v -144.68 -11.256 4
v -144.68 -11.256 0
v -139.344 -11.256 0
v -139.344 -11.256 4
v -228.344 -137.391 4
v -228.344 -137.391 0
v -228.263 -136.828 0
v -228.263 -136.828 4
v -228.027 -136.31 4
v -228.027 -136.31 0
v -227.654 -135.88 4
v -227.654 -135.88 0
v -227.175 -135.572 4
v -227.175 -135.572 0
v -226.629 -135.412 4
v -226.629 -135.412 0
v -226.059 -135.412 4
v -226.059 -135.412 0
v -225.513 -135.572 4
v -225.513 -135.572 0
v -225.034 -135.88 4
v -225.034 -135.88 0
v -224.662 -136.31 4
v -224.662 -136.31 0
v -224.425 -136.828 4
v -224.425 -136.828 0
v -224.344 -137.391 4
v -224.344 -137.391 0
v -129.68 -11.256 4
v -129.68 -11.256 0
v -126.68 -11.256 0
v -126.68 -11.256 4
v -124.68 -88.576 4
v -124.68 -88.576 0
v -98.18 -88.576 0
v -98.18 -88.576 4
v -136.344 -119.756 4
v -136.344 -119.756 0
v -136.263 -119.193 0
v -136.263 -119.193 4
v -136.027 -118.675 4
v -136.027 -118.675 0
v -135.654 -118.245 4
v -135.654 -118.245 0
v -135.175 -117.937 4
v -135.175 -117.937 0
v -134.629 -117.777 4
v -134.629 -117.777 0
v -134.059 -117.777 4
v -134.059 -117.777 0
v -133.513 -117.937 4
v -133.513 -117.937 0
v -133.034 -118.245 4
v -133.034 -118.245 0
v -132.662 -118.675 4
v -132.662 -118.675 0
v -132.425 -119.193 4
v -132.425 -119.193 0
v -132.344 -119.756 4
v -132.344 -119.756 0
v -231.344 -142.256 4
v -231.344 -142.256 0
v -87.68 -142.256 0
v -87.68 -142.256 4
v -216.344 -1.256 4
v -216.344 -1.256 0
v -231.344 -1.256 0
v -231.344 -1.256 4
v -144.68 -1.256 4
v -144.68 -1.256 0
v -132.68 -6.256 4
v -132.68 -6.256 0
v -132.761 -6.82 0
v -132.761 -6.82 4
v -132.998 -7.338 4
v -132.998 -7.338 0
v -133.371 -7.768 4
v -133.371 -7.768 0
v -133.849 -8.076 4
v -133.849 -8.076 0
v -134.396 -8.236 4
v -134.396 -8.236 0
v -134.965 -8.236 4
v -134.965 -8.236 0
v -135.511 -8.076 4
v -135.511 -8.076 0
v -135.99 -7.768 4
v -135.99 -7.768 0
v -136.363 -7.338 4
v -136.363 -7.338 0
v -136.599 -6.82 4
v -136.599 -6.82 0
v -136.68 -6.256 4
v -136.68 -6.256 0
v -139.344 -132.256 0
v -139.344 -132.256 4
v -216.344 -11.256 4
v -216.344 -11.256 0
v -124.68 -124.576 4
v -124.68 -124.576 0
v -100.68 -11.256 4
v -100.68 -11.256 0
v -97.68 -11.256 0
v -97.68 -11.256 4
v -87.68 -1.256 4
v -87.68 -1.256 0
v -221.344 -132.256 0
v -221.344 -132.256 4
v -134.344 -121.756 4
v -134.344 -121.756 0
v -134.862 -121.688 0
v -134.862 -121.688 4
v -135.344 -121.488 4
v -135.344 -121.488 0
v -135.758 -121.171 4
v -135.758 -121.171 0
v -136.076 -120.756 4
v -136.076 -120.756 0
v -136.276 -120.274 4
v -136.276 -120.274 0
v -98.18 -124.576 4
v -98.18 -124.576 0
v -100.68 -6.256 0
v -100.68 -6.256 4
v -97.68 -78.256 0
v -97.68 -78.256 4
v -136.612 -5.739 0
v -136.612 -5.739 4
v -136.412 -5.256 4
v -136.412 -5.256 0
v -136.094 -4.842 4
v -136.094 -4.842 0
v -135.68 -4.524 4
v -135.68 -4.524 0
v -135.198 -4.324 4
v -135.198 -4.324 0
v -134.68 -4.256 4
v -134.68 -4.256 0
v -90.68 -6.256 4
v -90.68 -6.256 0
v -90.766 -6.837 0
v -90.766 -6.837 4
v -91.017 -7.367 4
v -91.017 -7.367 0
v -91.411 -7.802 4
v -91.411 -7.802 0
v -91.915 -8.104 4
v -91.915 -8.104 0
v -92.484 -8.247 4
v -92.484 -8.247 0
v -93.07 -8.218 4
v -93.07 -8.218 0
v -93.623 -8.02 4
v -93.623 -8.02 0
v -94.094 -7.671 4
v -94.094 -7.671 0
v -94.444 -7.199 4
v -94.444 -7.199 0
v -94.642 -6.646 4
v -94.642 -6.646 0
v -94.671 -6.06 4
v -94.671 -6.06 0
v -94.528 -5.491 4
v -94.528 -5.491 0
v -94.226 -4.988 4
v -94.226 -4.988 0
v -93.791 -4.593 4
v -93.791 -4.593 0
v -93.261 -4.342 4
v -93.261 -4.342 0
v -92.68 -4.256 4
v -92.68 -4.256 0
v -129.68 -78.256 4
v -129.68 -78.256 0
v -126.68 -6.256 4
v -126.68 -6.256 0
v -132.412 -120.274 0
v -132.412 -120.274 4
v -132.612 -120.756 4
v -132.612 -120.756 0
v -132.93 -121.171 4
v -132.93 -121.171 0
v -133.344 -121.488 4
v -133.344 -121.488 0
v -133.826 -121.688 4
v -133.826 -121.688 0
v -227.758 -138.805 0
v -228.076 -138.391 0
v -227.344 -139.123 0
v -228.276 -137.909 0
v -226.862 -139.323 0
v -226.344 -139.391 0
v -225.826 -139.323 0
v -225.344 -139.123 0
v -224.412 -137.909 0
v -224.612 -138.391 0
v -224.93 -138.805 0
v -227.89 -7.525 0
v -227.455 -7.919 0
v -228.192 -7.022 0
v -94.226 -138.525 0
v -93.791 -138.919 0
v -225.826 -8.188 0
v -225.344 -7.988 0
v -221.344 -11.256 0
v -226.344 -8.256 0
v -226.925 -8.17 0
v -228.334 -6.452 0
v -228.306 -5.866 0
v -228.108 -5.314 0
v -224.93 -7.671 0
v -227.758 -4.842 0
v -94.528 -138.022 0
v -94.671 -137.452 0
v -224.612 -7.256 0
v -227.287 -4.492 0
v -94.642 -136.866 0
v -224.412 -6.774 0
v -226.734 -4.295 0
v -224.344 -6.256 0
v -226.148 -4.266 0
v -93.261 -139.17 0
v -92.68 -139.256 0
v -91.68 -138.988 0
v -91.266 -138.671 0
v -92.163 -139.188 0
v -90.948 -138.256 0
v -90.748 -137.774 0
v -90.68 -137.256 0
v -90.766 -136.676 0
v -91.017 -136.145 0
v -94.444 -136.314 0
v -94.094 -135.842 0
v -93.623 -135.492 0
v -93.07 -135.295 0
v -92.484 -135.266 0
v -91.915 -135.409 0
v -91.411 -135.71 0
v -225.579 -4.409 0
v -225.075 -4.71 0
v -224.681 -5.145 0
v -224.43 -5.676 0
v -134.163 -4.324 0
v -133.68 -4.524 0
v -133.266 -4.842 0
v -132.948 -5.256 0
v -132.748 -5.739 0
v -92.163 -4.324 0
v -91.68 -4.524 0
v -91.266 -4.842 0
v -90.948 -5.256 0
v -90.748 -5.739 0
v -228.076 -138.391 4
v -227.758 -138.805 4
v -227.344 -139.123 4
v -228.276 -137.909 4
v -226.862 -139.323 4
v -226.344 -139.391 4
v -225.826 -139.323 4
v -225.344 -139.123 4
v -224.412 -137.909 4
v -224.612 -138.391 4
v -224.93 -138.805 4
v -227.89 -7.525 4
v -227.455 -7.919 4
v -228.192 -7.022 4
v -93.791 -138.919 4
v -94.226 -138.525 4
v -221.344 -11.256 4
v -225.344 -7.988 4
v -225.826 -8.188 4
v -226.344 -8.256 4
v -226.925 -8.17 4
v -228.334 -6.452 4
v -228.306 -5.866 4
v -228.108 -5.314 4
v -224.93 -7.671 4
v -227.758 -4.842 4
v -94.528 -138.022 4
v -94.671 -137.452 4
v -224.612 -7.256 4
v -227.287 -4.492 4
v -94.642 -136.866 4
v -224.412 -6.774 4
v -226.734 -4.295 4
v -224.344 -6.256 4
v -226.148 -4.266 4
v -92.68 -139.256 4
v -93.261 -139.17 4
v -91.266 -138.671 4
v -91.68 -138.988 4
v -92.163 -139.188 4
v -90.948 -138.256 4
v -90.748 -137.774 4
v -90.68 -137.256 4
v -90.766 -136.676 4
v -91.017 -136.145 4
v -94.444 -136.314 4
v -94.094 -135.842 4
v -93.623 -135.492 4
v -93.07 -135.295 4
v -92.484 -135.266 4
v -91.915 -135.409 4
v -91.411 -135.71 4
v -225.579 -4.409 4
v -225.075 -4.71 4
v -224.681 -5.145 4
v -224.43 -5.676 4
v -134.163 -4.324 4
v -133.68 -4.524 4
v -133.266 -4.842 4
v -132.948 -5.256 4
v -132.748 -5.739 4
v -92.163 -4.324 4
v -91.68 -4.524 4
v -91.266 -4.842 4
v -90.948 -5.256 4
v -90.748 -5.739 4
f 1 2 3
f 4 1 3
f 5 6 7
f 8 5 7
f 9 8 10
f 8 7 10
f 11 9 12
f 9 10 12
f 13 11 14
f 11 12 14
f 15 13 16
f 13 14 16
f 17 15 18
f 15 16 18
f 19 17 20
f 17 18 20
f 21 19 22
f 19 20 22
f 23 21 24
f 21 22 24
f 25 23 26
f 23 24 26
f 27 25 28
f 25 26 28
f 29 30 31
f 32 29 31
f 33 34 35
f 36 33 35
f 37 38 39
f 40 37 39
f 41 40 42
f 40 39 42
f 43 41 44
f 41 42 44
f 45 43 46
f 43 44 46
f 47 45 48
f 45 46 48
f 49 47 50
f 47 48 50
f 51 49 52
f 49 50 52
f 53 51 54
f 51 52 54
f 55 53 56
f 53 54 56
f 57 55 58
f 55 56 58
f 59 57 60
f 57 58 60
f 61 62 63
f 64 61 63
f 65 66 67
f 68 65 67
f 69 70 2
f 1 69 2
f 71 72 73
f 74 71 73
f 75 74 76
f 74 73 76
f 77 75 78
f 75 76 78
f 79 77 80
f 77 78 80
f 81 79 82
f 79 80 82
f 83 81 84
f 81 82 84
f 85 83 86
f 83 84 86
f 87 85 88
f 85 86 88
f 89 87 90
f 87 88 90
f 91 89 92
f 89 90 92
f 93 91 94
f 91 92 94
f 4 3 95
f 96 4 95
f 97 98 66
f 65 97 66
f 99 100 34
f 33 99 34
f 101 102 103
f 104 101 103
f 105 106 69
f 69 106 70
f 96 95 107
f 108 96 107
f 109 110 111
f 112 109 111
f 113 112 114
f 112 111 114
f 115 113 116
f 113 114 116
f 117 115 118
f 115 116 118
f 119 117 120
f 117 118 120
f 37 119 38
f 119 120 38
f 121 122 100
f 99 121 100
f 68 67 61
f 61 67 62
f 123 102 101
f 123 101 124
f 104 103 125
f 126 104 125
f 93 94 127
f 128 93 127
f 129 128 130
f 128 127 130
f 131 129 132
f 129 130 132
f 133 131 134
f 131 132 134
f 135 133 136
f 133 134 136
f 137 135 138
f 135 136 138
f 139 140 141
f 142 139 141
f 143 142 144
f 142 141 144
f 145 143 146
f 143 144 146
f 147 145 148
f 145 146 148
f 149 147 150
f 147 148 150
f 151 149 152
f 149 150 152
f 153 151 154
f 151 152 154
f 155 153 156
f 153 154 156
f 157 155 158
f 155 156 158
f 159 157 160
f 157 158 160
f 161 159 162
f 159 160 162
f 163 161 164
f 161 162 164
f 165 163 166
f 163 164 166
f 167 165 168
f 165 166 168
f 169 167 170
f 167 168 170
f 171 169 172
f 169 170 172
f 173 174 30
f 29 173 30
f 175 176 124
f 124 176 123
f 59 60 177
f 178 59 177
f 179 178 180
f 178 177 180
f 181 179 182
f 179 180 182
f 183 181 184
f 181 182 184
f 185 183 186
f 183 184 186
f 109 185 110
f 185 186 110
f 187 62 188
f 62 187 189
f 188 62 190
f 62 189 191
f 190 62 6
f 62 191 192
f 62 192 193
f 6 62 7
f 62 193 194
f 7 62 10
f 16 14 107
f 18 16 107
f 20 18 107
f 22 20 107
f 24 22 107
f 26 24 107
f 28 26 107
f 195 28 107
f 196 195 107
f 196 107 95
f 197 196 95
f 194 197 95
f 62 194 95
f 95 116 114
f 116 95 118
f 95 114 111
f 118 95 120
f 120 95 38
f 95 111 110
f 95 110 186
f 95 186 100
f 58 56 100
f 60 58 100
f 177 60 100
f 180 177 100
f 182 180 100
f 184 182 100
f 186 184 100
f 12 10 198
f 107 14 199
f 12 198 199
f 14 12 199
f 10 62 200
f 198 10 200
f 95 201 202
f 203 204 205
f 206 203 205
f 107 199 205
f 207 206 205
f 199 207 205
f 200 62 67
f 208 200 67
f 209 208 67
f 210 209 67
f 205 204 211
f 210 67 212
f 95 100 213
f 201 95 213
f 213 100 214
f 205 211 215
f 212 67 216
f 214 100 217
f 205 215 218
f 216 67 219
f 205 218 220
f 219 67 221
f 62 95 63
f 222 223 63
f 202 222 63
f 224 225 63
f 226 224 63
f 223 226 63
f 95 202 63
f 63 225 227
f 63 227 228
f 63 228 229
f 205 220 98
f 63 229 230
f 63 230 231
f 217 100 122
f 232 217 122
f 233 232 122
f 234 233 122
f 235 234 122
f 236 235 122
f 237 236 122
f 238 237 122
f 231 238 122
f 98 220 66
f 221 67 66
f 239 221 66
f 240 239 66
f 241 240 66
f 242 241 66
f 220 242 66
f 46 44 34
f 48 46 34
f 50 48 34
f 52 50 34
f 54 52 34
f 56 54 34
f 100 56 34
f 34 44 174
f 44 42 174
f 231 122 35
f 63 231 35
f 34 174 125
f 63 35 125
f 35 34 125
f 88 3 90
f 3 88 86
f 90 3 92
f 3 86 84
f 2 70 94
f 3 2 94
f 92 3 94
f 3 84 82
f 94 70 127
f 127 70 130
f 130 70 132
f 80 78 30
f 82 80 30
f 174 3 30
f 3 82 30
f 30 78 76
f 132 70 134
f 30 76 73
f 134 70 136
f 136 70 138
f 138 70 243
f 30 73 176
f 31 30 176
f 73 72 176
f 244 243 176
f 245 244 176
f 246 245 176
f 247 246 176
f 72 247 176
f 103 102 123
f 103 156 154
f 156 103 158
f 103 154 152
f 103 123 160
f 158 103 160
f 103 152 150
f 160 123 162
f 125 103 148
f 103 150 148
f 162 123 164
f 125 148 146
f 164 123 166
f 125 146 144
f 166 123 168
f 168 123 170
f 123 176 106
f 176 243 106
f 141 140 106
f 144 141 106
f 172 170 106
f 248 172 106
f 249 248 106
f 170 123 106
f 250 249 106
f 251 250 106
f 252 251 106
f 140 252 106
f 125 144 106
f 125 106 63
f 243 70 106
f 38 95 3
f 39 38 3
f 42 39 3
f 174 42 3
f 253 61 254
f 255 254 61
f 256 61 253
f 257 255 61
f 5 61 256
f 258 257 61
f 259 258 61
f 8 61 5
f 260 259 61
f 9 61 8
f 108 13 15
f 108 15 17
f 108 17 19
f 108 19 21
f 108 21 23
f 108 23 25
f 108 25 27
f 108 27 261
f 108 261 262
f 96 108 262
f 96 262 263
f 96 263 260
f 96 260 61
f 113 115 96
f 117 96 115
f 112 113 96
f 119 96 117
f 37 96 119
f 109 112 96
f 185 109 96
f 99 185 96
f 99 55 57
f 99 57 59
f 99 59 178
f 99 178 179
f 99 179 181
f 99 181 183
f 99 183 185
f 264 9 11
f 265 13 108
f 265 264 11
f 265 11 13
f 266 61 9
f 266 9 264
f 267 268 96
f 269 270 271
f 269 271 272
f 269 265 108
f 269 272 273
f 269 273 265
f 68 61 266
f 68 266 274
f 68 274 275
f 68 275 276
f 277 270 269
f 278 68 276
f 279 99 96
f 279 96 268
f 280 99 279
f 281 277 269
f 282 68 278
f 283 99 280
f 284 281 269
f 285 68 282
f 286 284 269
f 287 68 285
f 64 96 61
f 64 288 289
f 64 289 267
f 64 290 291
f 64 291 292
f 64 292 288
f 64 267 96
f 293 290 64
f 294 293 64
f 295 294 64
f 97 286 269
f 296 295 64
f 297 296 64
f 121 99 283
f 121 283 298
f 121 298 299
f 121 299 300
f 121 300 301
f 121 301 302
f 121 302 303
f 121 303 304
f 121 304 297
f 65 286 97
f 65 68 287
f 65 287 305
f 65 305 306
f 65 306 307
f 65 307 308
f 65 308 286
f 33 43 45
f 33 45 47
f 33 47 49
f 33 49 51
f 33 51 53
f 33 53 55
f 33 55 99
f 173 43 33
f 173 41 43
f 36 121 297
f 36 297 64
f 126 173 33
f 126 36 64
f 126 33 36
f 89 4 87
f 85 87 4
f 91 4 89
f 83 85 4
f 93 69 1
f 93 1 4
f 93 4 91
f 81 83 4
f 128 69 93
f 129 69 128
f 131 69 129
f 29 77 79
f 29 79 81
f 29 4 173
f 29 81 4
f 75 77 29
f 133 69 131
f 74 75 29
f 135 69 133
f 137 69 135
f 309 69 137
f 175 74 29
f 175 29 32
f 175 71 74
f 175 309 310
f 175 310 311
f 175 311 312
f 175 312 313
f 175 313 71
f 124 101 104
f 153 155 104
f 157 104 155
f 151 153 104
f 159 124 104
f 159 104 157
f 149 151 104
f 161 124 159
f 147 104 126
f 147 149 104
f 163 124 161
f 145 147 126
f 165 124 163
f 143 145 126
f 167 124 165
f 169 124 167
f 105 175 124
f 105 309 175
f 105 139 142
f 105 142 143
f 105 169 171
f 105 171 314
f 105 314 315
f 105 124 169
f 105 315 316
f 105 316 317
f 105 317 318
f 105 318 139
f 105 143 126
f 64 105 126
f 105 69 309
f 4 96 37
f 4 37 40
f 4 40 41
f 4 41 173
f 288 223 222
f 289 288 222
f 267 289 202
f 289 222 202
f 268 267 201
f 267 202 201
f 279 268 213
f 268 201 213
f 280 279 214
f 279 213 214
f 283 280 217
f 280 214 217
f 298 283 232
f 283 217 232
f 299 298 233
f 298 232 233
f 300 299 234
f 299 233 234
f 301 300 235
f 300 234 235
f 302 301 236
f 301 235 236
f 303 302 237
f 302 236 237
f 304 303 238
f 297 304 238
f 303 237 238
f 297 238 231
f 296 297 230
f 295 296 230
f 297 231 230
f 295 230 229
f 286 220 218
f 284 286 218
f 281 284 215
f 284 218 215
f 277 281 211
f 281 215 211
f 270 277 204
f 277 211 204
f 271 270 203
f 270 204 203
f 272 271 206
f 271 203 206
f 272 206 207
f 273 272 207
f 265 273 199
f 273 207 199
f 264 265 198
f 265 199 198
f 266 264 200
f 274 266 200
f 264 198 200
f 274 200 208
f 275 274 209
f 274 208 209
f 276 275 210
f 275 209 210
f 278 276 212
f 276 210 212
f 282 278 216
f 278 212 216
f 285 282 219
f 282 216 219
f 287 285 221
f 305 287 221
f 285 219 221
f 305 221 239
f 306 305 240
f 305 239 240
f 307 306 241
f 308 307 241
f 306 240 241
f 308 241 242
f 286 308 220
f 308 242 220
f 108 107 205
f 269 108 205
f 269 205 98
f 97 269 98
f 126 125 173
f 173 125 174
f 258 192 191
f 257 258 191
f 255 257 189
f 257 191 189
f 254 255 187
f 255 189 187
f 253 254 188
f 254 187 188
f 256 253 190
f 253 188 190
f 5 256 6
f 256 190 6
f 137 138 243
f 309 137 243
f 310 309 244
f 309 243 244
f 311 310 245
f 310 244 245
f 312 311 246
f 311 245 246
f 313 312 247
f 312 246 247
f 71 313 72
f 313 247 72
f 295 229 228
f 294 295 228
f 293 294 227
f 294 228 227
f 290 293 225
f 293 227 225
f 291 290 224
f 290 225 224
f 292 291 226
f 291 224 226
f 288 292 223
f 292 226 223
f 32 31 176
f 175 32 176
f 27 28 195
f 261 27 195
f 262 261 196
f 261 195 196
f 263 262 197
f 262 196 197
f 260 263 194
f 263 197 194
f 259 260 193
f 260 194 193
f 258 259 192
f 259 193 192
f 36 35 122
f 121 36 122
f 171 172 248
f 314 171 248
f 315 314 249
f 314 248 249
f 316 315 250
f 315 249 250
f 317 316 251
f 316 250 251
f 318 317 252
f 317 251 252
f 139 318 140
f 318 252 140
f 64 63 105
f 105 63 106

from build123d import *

# Parameters (mm, degrees)
F0_W     = 3
F0_H     = 5
F1_DEPTH = 4


with BuildPart() as f1:
    # F0 (on Top) → F1 (new body)
    with BuildSketch(Plane.XY):
        with BuildLine():
            Line((-228.3440142274, -137.3912245035), (-231.3440142274, -137.3912245035))
            Line((-231.3440142274, -137.3912245035), (-231.3440142274, -142.256315279))
            Line((-231.3440142274, -142.256315279), (-226.3440142274, -142.256315279))
            Line((-226.3440142274, -142.256315279), (-226.3440142274, -139.3912245035))
            ThreePointArc((-226.3440142274, -139.3912245035), (-227.7582277898, -138.8054380659), (-228.3440142274, -137.3912245035))
        make_face()
        with BuildLine():
            Line((-87.6802765131, -142.256315279), (-87.6802765131, -137.256315279))
            Line((-87.6802765131, -137.256315279), (-90.6802765131, -137.256315279))
            ThreePointArc((-90.6802765131, -137.256315279), (-91.2660629507, -138.6705288414), (-92.6802765131, -139.256315279))
            Line((-92.6802765131, -139.256315279), (-92.6802765131, -142.256315279))
            Line((-92.6802765131, -142.256315279), (-87.6802765131, -142.256315279))
        make_face()
        with BuildLine():
            Line((-87.6802765131, -1.256315279), (-92.6802765131, -1.256315279))
            Line((-92.6802765131, -1.256315279), (-92.6802765131, -4.256315279))
            ThreePointArc((-92.6802765131, -4.256315279), (-91.2660629507, -4.8421017166), (-90.6802765131, -6.256315279))
            Line((-90.6802765131, -6.256315279), (-87.6802765131, -6.256315279))
            Line((-87.6802765131, -6.256315279), (-87.6802765131, -1.256315279))
        make_face()
        with BuildLine():
            Line((-134.6802765131, -1.256315279), (-139.6802765131, -1.256315279))
            Line((-139.6802765131, -1.256315279), (-139.6802765131, -6.256315279))
            Line((-139.6802765131, -6.256315279), (-136.6802765131, -6.256315279))
            ThreePointArc((-136.6802765131, -6.256315279), (-136.0944900755, -4.8421017166), (-134.6802765131, -4.256315279))
            Line((-134.6802765131, -4.256315279), (-134.6802765131, -1.256315279))
        make_face()
        with BuildLine():
            Line((-221.3440142274, -132.256315279), (-231.3440142274, -132.256315279))
            Line((-231.3440142274, -132.256315279), (-231.3440142274, -137.3912245035))
            Line((-231.3440142274, -137.3912245035), (-228.3440142274, -137.3912245035))
            ThreePointArc((-228.3440142274, -137.3912245035), (-226.3440142274, -135.3912245035), (-224.3440142274, -137.3912245035))
            ThreePointArc((-224.3440142274, -137.3912245035), (-224.929800665, -138.8054380659), (-226.3440142274, -139.3912245035))
            Line((-226.3440142274, -139.3912245035), (-226.3440142274, -142.256315279))
            Line((-226.3440142274, -142.256315279), (-221.3440142274, -142.256315279))
            Line((-221.3440142274, -142.256315279), (-221.3440142274, -132.256315279))
        make_face()
        Polygon((-217.9440142274, -132.256315279), (-221.3440142274, -132.256315279), (-221.3440142274, -142.256315279), (-139.3440142274, -142.256315279), (-139.4949736476, -132.256315279), (-142.7440142274, -132.256315279), (-147.4240142274, -132.256315279), (-151.4240142274, -132.256315279), align=None)
        Polygon((-216.3440142274, -11.256315279), (-216.3440142274, -1.256315279), (-221.3440142274, -1.256315279), (-221.3440142274, -6.256315279), (-221.3440142274, -11.256315279), (-217.9440142274, -11.256315279), align=None)
        Polygon((-139.6802765131, -6.256315279), (-139.6802765131, -1.256315279), (-144.6802765131, -1.256315279), (-144.6802765131, -11.256315279), (-142.7440142274, -11.256315279), (-139.6802765131, -11.256315279), align=None)
        Polygon((-134.3440142274, -124.756315279), (-139.3440142274, -124.756315279), (-139.3440142274, -128.856315279), (-139.3440142274, -132.256315279), (-139.4949736476, -132.256315279), (-139.3440142274, -142.256315279), (-129.6802765131, -142.256315279), (-129.6802765131, -124.756315279), align=None)
        with BuildLine():
            Line((-221.3440142274, -6.256315279), (-221.3440142274, -1.256315279))
            Line((-221.3440142274, -1.256315279), (-231.3440142274, -1.256315279))
            Line((-231.3440142274, -1.256315279), (-231.3440142274, -132.256315279))
            Line((-231.3440142274, -132.256315279), (-221.3440142274, -132.256315279))
            Line((-221.3440142274, -132.256315279), (-221.3440142274, -128.856315279))
            Line((-221.3440142274, -128.856315279), (-221.3440142274, -14.656315279))
            Line((-221.3440142274, -14.656315279), (-221.3440142274, -11.256315279))
            Line((-221.3440142274, -11.256315279), (-226.3440142274, -11.256315279))
            Line((-226.3440142274, -11.256315279), (-226.3440142274, -8.256315279))
            ThreePointArc((-226.3440142274, -8.256315279), (-227.7582277898, -4.8421017166), (-224.3440142274, -6.256315279))
            Line((-224.3440142274, -6.256315279), (-221.3440142274, -6.256315279))
        make_face()
        with BuildLine():
            Line((-129.6802765131, -1.256315279), (-134.6802765131, -1.256315279))
            Line((-134.6802765131, -1.256315279), (-134.6802765131, -4.256315279))
            ThreePointArc((-134.6802765131, -4.256315279), (-133.2660629507, -4.8421017166), (-132.6802765131, -6.256315279))
            ThreePointArc((-132.6802765131, -6.256315279), (-134.6802765131, -8.256315279), (-136.6802765131, -6.256315279))
            Line((-136.6802765131, -6.256315279), (-139.6802765131, -6.256315279))
            Line((-139.6802765131, -6.256315279), (-139.6802765131, -11.256315279))
            Line((-139.6802765131, -11.256315279), (-139.4949736476, -11.256315279))
            Line((-139.4949736476, -11.256315279), (-139.3440142274, -11.256315279))
            Line((-139.3440142274, -11.256315279), (-129.6802765131, -11.256315279))
            Line((-129.6802765131, -11.256315279), (-129.6802765131, -6.256315279))
            Line((-129.6802765131, -6.256315279), (-129.6802765131, -1.256315279))
        make_face()
        with BuildLine():
            Line((-92.6802765131, -1.256315279), (-129.6802765131, -1.256315279))
            Line((-129.6802765131, -1.256315279), (-129.6802765131, -6.256315279))
            Line((-129.6802765131, -6.256315279), (-126.6802765131, -6.256315279))
            Line((-126.6802765131, -6.256315279), (-100.6802765131, -6.256315279))
            Line((-100.6802765131, -6.256315279), (-97.6802765131, -6.256315279))
            Line((-97.6802765131, -6.256315279), (-97.6802765131, -11.256315279))
            Line((-97.6802765131, -11.256315279), (-97.6802765131, -14.596315279))
            Line((-97.6802765131, -14.596315279), (-97.6802765131, -74.916315279))
            Line((-97.6802765131, -74.916315279), (-97.6802765131, -78.256315279))
            Line((-97.6802765131, -78.256315279), (-101.0202765131, -78.256315279))
            Line((-101.0202765131, -78.256315279), (-126.3402765131, -78.256315279))
            Line((-126.3402765131, -78.256315279), (-129.6802765131, -78.256315279))
            Line((-129.6802765131, -78.256315279), (-129.6802765131, -108.756315279))
            Line((-129.6802765131, -108.756315279), (-129.6802765131, -111.756315279))
            Line((-129.6802765131, -111.756315279), (-129.6802765131, -114.756315279))
            Line((-129.6802765131, -114.756315279), (-129.6802765131, -124.756315279))
            Line((-129.6802765131, -124.756315279), (-129.6802765131, -142.256315279))
            Line((-129.6802765131, -142.256315279), (-92.6802765131, -142.256315279))
            Line((-92.6802765131, -142.256315279), (-92.6802765131, -139.256315279))
            ThreePointArc((-92.6802765131, -139.256315279), (-94.0944900755, -135.8421017166), (-90.6802765131, -137.256315279))
            Line((-90.6802765131, -137.256315279), (-87.6802765131, -137.256315279))
            Line((-87.6802765131, -137.256315279), (-87.6802765131, -6.256315279))
            Line((-87.6802765131, -6.256315279), (-90.6802765131, -6.256315279))
            ThreePointArc((-90.6802765131, -6.256315279), (-94.0944900755, -7.6705288414), (-92.6802765131, -4.256315279))
            Line((-92.6802765131, -4.256315279), (-92.6802765131, -1.256315279))
        make_face()
        Polygon((-98.1802765131, -124.5755243927), (-124.6802765131, -124.5755243927), (-124.6802765131, -90.2755243927), (-124.6802765131, -88.5755243927), (-122.9802765131, -88.5755243927), (-99.8802765131, -88.5755243927), (-98.1802765131, -88.5755243927), (-98.1802765131, -90.2755243927), align=None, mode=Mode.SUBTRACT)
        Polygon((-129.6802765131, -14.056315279), (-129.6802765131, -11.256315279), (-139.3440142274, -11.256315279), (-139.3440142274, -14.656315279), (-139.3440142274, -114.756315279), (-129.6802765131, -114.756315279), (-129.6802765131, -111.756315279), (-129.6802765131, -108.756315279), (-129.6802765131, -78.256315279), (-129.6802765131, -74.916315279), (-129.6802765131, -27.956315279), (-129.6802765131, -27.456315279), (-129.6802765131, -14.596315279), align=None)
        with BuildLine():
            Line((-139.3440142274, -119.756315279), (-139.3440142274, -124.756315279))
            Line((-139.3440142274, -124.756315279), (-134.3440142274, -124.756315279))
            Line((-134.3440142274, -124.756315279), (-134.3440142274, -121.756315279))
            ThreePointArc((-134.3440142274, -121.756315279), (-135.7582277898, -121.1705288414), (-136.3440142274, -119.756315279))
            Line((-136.3440142274, -119.756315279), (-139.3440142274, -119.756315279))
        make_face()
        with BuildLine():
            Line((-129.6802765131, -114.756315279), (-139.3440142274, -114.756315279))
            Line((-139.3440142274, -114.756315279), (-139.3440142274, -119.756315279))
            Line((-139.3440142274, -119.756315279), (-136.3440142274, -119.756315279))
            ThreePointArc((-136.3440142274, -119.756315279), (-134.3440142274, -117.756315279), (-132.3440142274, -119.756315279))
            ThreePointArc((-132.3440142274, -119.756315279), (-132.929800665, -121.1705288414), (-134.3440142274, -121.756315279))
            Line((-134.3440142274, -121.756315279), (-134.3440142274, -124.756315279))
            Line((-134.3440142274, -124.756315279), (-129.6802765131, -124.756315279))
            Line((-129.6802765131, -124.756315279), (-129.6802765131, -114.756315279))
        make_face()
        with BuildLine():
            Line((-221.3440142274, -11.256315279), (-221.3440142274, -6.256315279))
            Line((-221.3440142274, -6.256315279), (-224.3440142274, -6.256315279))
            ThreePointArc((-224.3440142274, -6.256315279), (-224.929800665, -7.6705288414), (-226.3440142274, -8.256315279))
            Line((-226.3440142274, -8.256315279), (-226.3440142274, -11.256315279))
            Line((-226.3440142274, -11.256315279), (-221.3440142274, -11.256315279))
        make_face()
        Polygon((-126.6802765131, -6.256315279), (-129.6802765131, -6.256315279), (-129.6802765131, -11.256315279), (-126.8802765131, -11.256315279), (-126.6802765131, -11.256315279), align=None)
        with Locations((-99.1802765131, -8.756315279)):
            Rectangle(F0_W, F0_H)
    extrude(amount=F1_DEPTH)


solid = f1.part
